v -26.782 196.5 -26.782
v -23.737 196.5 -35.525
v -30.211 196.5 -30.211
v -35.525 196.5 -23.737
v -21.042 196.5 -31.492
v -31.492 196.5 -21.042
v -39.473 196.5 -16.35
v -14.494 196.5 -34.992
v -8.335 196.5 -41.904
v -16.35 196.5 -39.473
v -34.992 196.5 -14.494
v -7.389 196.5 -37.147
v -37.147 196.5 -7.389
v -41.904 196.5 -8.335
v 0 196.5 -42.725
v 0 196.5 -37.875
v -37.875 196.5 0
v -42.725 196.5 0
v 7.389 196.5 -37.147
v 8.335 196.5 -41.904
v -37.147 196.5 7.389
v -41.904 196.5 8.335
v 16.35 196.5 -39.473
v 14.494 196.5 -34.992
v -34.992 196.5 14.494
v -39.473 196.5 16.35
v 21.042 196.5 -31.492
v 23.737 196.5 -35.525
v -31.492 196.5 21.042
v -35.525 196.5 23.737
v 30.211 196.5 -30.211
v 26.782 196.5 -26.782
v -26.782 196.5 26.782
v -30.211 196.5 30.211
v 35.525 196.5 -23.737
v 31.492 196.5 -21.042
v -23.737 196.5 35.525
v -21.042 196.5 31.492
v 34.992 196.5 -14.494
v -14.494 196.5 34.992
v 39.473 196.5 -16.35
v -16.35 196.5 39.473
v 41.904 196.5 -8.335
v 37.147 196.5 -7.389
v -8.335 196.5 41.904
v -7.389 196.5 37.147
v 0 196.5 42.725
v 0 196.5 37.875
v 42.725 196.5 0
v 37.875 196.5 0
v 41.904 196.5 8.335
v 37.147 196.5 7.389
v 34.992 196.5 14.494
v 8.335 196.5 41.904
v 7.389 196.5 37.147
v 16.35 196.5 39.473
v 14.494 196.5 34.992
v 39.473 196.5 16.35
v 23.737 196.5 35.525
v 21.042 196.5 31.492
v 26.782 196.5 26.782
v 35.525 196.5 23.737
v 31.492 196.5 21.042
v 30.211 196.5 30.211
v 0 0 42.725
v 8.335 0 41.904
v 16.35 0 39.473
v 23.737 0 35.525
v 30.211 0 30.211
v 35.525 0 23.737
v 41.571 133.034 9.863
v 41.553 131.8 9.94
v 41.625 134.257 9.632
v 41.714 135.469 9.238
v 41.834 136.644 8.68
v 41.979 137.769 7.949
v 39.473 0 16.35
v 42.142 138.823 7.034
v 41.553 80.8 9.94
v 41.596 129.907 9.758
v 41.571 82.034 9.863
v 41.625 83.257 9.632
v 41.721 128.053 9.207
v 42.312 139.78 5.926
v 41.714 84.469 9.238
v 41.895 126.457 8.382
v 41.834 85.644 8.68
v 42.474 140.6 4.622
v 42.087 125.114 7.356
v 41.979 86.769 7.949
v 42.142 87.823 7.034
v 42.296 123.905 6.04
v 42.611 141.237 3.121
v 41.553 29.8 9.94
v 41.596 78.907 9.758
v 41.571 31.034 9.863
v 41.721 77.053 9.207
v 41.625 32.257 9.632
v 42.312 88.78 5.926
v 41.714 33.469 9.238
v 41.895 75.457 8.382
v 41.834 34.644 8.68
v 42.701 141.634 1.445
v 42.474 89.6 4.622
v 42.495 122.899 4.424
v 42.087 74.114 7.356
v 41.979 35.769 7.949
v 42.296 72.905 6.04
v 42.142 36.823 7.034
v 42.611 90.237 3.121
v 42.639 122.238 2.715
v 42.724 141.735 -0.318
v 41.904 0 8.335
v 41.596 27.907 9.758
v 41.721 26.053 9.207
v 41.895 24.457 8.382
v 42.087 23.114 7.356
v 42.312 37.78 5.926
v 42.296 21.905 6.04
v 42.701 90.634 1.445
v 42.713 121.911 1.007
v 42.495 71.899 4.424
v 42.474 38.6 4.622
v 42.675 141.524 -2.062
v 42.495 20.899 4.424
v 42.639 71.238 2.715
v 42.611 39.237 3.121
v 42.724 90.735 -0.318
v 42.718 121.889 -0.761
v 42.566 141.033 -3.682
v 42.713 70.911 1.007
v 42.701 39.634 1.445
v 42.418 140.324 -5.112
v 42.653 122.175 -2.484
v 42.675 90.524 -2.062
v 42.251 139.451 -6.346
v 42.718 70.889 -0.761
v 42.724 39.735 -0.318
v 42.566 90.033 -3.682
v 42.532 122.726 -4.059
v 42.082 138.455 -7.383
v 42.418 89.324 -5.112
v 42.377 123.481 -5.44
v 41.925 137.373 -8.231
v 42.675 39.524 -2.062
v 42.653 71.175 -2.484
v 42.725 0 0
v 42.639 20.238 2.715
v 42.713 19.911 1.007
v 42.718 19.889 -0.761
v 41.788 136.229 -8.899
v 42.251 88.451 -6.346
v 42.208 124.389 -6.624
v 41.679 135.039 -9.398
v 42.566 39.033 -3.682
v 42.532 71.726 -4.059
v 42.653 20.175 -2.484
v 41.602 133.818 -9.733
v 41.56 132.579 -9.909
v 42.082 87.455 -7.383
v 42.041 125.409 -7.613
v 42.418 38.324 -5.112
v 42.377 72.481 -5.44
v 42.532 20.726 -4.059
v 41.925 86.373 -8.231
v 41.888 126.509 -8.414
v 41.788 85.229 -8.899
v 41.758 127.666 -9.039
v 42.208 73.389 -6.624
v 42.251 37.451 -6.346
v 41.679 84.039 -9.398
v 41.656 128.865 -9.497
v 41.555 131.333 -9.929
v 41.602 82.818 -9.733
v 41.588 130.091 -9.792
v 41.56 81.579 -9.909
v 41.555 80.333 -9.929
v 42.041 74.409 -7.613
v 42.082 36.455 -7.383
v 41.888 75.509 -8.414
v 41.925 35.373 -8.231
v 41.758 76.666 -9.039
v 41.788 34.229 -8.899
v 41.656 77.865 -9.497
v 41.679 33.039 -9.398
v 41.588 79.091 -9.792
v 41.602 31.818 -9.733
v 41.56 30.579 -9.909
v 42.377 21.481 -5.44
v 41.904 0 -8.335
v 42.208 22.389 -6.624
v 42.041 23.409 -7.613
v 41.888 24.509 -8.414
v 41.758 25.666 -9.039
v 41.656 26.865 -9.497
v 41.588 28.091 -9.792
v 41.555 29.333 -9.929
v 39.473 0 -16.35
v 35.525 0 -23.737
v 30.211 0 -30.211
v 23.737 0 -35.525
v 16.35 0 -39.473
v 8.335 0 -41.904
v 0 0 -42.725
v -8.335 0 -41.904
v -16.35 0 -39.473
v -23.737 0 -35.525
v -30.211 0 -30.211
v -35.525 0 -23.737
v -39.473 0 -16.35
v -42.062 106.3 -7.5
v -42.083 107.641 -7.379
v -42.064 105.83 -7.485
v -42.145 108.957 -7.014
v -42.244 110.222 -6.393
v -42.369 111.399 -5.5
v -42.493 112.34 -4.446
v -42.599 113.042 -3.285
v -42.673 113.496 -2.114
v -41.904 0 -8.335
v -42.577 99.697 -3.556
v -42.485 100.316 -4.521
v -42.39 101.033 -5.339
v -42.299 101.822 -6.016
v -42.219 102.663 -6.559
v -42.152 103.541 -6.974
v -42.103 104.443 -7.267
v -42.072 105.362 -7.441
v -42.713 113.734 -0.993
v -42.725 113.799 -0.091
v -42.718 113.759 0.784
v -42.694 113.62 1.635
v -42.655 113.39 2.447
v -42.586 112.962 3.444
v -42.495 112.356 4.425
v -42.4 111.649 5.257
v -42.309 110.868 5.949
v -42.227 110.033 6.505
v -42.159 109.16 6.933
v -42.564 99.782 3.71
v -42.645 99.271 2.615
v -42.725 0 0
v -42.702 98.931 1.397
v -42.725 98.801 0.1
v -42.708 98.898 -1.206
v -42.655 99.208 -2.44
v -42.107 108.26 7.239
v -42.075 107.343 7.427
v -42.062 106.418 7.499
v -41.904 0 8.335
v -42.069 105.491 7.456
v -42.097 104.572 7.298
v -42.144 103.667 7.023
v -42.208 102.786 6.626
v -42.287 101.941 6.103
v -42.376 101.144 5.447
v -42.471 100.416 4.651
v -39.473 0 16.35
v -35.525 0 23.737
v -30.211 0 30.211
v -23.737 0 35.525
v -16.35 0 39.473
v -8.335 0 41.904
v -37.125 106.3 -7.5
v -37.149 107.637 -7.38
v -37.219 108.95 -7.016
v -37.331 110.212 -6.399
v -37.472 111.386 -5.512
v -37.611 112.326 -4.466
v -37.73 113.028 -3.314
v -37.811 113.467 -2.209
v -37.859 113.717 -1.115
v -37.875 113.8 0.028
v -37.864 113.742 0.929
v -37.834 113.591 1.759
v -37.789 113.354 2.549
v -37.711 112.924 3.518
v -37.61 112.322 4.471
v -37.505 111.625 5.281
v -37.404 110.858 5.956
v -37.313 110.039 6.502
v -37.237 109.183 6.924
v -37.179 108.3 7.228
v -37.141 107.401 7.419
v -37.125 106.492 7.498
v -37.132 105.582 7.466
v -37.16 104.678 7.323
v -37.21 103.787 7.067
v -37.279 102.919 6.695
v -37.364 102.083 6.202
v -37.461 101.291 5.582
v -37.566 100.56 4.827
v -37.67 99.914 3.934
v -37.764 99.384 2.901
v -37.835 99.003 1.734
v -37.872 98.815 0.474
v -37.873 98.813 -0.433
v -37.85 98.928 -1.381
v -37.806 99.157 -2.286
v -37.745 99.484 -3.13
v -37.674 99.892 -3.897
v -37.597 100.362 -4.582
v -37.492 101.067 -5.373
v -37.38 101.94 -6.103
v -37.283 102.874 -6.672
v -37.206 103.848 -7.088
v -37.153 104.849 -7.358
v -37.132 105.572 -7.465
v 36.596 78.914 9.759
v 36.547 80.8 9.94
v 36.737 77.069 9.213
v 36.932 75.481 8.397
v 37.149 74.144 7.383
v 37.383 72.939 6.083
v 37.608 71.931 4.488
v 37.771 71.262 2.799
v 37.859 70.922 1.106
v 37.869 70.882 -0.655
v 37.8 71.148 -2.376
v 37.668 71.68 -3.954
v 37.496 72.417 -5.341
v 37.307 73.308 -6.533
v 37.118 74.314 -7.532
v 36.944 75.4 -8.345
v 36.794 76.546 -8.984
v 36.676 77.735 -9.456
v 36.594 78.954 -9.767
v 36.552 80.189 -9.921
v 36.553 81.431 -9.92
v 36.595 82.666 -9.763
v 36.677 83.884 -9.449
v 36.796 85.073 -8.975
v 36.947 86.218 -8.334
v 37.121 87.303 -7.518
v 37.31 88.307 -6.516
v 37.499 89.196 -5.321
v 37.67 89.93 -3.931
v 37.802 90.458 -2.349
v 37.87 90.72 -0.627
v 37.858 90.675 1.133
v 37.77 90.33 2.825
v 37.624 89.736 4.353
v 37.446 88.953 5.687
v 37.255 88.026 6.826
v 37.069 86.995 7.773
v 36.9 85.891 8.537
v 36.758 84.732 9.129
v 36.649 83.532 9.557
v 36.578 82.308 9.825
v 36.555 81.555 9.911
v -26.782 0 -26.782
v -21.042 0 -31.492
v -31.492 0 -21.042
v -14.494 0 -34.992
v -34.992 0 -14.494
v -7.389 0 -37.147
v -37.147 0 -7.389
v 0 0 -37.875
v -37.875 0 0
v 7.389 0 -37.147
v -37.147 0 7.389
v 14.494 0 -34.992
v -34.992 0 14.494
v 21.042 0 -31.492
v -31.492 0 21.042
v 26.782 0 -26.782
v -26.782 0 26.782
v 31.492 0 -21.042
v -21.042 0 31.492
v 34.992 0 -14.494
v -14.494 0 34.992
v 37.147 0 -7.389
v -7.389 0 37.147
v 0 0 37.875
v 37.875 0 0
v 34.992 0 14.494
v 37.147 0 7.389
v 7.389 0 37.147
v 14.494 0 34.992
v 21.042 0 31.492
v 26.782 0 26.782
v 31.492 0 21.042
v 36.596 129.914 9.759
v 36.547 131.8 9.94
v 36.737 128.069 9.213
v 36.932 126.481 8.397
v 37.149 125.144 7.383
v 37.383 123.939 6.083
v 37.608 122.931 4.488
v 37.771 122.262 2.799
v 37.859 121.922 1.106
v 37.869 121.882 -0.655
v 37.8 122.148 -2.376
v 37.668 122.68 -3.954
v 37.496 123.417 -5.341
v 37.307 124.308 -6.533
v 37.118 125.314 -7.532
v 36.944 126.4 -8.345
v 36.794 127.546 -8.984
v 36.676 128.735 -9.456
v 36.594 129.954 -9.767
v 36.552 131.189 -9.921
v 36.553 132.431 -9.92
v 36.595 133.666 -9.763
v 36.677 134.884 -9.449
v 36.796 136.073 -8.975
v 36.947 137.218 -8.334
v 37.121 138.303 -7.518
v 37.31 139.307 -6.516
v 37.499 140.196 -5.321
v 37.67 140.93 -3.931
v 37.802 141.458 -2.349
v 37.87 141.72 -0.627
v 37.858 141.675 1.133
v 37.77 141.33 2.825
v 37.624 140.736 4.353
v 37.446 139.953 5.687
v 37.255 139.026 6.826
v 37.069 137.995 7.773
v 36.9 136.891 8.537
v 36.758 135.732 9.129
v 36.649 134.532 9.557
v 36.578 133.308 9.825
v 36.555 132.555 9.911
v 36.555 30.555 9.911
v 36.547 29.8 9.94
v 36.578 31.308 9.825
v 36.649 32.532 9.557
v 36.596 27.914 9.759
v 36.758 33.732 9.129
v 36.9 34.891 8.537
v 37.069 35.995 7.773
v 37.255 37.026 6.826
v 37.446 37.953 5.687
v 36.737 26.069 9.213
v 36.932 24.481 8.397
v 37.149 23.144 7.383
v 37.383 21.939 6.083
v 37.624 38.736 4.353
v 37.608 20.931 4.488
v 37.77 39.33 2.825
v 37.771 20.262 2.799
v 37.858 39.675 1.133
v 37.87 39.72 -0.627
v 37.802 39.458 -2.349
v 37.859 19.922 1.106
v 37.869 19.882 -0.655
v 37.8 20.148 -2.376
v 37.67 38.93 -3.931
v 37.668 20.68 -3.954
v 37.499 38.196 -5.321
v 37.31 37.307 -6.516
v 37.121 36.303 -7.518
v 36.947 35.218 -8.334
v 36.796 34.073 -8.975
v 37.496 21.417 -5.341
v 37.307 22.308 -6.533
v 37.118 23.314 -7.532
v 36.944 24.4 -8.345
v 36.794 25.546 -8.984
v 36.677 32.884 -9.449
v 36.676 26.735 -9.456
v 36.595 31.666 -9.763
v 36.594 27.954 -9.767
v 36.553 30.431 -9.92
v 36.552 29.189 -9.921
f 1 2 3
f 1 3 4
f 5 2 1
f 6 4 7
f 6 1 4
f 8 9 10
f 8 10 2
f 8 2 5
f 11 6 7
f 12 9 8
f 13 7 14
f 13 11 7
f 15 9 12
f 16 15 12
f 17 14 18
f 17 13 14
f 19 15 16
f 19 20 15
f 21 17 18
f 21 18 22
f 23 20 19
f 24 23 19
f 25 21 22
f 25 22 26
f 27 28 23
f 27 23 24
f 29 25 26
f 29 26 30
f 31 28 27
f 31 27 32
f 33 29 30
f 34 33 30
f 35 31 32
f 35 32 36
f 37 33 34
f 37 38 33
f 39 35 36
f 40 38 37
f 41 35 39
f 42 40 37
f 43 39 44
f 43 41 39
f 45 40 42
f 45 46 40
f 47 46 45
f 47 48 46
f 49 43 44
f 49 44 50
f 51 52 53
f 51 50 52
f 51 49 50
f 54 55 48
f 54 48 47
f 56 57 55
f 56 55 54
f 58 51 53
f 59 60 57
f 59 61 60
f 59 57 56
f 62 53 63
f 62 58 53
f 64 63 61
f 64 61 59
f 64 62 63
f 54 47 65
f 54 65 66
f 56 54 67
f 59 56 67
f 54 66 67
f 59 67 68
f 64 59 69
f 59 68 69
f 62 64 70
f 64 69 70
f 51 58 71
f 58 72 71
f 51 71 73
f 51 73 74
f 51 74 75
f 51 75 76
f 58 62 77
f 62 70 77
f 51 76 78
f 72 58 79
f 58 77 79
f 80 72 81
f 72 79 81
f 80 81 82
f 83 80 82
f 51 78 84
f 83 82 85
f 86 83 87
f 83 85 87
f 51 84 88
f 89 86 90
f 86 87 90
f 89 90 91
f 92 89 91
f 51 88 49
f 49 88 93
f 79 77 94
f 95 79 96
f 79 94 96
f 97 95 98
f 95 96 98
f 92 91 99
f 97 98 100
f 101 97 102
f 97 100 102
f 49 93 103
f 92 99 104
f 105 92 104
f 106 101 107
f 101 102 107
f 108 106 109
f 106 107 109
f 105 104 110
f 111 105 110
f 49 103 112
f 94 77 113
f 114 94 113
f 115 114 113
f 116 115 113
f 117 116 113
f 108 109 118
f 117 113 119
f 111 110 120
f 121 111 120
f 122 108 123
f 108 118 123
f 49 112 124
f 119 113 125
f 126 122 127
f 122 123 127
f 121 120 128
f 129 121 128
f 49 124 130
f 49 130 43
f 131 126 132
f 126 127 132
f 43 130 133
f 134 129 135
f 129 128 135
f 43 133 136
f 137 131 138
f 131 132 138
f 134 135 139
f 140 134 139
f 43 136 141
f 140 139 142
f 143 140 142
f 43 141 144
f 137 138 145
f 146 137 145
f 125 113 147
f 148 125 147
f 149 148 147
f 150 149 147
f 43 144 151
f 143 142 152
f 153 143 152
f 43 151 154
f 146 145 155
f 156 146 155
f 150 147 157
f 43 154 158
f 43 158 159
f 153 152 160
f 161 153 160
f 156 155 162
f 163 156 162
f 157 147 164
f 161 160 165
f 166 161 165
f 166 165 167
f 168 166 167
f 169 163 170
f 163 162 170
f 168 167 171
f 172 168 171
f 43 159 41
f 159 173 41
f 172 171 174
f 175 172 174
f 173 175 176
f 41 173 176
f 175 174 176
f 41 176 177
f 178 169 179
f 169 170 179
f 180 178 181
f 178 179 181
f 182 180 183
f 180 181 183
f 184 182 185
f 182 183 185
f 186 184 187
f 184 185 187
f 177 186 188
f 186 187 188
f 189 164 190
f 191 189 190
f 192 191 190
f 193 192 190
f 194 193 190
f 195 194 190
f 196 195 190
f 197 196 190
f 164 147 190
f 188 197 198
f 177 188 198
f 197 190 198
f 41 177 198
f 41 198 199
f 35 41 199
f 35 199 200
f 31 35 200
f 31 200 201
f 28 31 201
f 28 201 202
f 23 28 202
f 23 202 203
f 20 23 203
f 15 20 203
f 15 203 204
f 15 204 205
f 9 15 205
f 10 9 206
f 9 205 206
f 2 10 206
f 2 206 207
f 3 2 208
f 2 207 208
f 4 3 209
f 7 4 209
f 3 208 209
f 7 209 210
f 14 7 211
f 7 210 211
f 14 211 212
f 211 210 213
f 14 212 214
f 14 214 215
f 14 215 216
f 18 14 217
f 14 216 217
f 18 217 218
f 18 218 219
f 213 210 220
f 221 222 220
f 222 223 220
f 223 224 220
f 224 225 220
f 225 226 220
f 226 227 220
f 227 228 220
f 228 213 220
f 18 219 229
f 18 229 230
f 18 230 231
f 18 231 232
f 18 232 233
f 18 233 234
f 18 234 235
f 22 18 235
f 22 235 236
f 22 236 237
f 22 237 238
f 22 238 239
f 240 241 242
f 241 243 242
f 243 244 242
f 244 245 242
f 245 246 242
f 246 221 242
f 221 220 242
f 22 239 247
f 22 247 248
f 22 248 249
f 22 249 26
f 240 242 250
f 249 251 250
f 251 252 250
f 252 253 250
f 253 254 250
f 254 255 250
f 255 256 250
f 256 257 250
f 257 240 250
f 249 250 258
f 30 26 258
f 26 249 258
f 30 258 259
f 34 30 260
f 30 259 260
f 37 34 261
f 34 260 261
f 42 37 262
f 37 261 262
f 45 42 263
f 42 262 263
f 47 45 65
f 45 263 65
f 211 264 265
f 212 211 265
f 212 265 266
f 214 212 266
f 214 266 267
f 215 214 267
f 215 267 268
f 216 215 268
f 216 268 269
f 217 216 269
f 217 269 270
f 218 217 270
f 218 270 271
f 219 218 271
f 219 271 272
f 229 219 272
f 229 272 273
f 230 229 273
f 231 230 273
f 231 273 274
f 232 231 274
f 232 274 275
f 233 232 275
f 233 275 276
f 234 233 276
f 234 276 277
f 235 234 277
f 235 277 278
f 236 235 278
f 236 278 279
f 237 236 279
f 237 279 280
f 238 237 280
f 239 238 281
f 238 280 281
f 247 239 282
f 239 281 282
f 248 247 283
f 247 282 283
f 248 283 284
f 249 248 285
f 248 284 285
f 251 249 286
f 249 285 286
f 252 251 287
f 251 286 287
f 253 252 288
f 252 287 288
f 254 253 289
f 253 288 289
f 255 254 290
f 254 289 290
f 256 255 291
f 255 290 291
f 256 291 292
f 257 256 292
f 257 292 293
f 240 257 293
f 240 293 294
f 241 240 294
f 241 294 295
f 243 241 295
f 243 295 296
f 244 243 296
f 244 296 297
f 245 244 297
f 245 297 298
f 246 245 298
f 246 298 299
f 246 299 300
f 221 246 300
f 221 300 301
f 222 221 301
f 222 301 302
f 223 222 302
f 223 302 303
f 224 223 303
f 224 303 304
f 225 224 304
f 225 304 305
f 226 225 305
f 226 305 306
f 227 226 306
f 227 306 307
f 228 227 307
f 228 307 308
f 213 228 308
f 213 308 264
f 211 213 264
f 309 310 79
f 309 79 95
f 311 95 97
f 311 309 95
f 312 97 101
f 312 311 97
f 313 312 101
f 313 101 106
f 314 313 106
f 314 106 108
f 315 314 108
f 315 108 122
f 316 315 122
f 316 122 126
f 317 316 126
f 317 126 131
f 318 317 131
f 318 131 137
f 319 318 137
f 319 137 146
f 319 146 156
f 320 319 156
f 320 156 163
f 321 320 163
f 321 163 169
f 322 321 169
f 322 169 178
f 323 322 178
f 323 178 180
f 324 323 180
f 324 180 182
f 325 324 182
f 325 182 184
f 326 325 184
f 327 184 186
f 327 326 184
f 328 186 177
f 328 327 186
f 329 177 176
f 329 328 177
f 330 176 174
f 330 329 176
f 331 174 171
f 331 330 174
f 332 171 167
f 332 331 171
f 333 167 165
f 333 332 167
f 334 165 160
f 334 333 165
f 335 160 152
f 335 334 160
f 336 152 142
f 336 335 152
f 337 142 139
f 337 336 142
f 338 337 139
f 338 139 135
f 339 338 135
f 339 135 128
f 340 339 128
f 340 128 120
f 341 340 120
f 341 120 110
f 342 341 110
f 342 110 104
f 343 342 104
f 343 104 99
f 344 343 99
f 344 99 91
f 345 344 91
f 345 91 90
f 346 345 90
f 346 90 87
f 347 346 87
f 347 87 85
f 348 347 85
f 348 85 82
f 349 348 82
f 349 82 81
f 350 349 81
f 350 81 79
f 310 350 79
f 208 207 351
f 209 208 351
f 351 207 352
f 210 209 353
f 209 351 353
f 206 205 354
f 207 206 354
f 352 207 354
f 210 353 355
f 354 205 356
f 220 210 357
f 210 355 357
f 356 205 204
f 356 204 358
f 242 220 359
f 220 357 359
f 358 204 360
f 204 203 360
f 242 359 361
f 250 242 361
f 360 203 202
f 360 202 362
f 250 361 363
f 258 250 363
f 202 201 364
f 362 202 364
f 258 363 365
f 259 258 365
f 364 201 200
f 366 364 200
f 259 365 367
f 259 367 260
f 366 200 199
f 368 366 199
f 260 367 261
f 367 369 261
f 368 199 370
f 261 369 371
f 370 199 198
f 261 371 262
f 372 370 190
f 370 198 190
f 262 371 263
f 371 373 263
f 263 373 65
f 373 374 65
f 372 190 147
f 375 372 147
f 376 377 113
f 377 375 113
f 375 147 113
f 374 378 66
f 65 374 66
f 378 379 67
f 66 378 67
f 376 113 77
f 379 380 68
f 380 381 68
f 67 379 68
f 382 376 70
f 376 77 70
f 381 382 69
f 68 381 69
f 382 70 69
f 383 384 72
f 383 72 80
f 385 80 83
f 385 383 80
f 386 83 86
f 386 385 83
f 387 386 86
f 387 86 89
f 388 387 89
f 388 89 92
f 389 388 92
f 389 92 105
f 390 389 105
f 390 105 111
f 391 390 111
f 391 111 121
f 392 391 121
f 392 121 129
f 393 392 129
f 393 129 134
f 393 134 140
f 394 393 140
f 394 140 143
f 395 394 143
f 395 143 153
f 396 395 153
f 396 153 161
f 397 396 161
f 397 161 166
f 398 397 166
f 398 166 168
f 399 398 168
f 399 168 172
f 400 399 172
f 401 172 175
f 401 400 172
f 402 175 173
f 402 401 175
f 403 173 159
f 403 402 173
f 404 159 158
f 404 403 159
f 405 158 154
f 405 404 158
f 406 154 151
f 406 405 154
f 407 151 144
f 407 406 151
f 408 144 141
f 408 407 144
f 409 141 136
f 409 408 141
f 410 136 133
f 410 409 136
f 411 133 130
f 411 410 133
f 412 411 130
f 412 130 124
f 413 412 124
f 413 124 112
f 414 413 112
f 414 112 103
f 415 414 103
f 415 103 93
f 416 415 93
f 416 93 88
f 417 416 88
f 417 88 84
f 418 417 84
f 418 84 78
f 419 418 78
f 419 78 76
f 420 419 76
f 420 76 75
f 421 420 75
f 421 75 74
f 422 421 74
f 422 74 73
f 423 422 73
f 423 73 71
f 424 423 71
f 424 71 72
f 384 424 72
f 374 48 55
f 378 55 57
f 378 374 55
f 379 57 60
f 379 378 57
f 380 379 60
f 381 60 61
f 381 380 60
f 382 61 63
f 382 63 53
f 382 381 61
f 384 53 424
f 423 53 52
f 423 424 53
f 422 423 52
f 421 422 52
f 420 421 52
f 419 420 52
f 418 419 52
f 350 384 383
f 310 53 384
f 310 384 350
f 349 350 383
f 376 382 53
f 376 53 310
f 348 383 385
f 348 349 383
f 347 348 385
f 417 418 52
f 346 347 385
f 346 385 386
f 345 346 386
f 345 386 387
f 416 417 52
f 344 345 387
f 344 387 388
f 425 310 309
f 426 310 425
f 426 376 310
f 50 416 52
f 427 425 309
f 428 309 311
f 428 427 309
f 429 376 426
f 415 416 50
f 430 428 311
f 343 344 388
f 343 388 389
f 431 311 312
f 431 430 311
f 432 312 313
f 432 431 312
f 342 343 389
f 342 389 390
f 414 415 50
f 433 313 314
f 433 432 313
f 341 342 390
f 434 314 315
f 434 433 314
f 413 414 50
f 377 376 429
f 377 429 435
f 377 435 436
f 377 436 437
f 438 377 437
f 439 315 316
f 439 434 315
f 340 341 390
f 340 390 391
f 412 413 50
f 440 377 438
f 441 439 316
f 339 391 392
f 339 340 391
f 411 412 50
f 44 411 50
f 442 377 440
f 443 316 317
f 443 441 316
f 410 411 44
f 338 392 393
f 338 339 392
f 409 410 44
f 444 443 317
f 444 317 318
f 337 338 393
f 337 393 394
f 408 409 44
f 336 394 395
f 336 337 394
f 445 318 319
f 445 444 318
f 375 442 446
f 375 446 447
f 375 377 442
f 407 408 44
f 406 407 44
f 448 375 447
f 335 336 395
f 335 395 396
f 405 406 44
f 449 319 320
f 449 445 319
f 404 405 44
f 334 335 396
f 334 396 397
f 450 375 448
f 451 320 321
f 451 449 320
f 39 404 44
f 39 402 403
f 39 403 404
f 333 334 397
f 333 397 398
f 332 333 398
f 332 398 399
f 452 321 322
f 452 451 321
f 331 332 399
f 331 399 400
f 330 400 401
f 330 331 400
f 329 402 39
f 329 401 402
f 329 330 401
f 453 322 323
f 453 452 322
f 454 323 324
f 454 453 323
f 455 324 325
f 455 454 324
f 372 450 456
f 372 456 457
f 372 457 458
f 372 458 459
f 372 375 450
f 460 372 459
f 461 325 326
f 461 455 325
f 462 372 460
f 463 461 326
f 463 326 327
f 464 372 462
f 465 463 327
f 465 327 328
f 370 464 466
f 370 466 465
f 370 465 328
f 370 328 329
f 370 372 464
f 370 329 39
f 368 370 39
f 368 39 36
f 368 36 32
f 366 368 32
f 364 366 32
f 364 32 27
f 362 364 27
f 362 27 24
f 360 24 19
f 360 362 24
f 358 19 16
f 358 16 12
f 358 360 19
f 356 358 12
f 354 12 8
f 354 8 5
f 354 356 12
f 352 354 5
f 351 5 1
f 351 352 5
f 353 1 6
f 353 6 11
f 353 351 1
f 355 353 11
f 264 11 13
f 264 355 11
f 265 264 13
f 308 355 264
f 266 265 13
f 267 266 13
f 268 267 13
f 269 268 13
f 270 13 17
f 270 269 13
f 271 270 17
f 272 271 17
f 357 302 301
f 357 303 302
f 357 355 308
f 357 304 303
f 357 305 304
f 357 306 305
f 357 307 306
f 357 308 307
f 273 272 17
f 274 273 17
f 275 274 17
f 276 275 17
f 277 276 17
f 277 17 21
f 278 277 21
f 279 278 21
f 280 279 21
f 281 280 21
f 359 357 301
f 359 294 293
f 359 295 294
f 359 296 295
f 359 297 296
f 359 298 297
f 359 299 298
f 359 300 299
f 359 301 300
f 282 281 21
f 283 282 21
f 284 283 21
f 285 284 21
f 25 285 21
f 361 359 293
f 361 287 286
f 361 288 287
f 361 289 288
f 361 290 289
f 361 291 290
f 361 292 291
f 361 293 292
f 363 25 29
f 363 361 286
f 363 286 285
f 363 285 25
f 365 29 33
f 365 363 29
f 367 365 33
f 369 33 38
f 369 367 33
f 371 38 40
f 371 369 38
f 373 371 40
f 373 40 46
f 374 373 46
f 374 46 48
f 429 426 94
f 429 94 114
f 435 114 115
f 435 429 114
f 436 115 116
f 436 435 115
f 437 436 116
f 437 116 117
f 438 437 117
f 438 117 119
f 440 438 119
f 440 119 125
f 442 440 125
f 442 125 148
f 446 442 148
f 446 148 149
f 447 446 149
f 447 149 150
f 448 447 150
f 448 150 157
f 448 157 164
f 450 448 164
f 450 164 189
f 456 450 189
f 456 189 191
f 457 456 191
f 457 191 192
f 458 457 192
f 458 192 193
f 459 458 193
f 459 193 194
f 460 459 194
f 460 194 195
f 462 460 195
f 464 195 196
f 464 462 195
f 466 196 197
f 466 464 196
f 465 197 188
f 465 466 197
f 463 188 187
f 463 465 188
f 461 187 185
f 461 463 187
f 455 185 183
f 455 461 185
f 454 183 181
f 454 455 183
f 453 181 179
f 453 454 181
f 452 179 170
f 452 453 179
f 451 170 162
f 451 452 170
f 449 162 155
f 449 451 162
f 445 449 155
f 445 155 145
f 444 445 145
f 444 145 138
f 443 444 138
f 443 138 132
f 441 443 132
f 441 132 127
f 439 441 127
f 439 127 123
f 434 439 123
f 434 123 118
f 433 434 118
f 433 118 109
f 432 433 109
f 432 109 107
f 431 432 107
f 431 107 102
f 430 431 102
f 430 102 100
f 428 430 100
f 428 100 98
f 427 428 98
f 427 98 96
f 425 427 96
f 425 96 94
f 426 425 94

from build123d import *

# Parameters (mm, degrees)
SKETCH1_R           = 42.725
SKETCH1_R_2         = 37.875
BOSS_EXTRUDE1_DEPTH = 196.5
SKETCH2_R           = 9.94
CUT_EXTRUDE1_DEPTH  = 206.57991451
SKETCH4_R           = 7.5
CUT_EXTRUDE2_DEPTH  = 206.579914647


with BuildPart() as part:
    # Sketch1 → Boss-Extrude1 (new body)
    with BuildSketch(Plane(origin=(0, 0, 0), x_dir=(1, 0, 0), z_dir=(0, 1, 0))):
        with Locations(Location((0, 0, 0), (0, 0, 270))):
            Circle(SKETCH1_R)
        with Locations(Location((0, 0, 0), (0, 0, 270))):
            Circle(SKETCH1_R_2, mode=Mode.SUBTRACT)
    extrude(amount=BOSS_EXTRUDE1_DEPTH)

    # Sketch2 → Cut-Extrude1 (cut, through all)
    with BuildSketch(Plane(origin=(0, 0, 0), x_dir=(0, 0, -1), z_dir=(1, 0, 0))):
        with Locations(Location((0, 131.8, 0), (0, 0, 180))):
            Circle(SKETCH2_R)
        with Locations(Location((0, 80.8, 0), (0, 0, 180))):
            Circle(SKETCH2_R)
        with Locations(Location((0, 29.8, 0), (0, 0, 180))):
            Circle(SKETCH2_R)
    extrude(amount=CUT_EXTRUDE1_DEPTH, mode=Mode.SUBTRACT)

    # Sketch4 → Cut-Extrude2 (cut, through all)
    with BuildSketch(Plane(origin=(0, 0, 0), x_dir=(0, 0, -1), z_dir=(1, 0, 0))):
        with Locations((0, 106.3)):
            Circle(SKETCH4_R)
    extrude(amount=-CUT_EXTRUDE2_DEPTH, mode=Mode.SUBTRACT)


solid = part.part
